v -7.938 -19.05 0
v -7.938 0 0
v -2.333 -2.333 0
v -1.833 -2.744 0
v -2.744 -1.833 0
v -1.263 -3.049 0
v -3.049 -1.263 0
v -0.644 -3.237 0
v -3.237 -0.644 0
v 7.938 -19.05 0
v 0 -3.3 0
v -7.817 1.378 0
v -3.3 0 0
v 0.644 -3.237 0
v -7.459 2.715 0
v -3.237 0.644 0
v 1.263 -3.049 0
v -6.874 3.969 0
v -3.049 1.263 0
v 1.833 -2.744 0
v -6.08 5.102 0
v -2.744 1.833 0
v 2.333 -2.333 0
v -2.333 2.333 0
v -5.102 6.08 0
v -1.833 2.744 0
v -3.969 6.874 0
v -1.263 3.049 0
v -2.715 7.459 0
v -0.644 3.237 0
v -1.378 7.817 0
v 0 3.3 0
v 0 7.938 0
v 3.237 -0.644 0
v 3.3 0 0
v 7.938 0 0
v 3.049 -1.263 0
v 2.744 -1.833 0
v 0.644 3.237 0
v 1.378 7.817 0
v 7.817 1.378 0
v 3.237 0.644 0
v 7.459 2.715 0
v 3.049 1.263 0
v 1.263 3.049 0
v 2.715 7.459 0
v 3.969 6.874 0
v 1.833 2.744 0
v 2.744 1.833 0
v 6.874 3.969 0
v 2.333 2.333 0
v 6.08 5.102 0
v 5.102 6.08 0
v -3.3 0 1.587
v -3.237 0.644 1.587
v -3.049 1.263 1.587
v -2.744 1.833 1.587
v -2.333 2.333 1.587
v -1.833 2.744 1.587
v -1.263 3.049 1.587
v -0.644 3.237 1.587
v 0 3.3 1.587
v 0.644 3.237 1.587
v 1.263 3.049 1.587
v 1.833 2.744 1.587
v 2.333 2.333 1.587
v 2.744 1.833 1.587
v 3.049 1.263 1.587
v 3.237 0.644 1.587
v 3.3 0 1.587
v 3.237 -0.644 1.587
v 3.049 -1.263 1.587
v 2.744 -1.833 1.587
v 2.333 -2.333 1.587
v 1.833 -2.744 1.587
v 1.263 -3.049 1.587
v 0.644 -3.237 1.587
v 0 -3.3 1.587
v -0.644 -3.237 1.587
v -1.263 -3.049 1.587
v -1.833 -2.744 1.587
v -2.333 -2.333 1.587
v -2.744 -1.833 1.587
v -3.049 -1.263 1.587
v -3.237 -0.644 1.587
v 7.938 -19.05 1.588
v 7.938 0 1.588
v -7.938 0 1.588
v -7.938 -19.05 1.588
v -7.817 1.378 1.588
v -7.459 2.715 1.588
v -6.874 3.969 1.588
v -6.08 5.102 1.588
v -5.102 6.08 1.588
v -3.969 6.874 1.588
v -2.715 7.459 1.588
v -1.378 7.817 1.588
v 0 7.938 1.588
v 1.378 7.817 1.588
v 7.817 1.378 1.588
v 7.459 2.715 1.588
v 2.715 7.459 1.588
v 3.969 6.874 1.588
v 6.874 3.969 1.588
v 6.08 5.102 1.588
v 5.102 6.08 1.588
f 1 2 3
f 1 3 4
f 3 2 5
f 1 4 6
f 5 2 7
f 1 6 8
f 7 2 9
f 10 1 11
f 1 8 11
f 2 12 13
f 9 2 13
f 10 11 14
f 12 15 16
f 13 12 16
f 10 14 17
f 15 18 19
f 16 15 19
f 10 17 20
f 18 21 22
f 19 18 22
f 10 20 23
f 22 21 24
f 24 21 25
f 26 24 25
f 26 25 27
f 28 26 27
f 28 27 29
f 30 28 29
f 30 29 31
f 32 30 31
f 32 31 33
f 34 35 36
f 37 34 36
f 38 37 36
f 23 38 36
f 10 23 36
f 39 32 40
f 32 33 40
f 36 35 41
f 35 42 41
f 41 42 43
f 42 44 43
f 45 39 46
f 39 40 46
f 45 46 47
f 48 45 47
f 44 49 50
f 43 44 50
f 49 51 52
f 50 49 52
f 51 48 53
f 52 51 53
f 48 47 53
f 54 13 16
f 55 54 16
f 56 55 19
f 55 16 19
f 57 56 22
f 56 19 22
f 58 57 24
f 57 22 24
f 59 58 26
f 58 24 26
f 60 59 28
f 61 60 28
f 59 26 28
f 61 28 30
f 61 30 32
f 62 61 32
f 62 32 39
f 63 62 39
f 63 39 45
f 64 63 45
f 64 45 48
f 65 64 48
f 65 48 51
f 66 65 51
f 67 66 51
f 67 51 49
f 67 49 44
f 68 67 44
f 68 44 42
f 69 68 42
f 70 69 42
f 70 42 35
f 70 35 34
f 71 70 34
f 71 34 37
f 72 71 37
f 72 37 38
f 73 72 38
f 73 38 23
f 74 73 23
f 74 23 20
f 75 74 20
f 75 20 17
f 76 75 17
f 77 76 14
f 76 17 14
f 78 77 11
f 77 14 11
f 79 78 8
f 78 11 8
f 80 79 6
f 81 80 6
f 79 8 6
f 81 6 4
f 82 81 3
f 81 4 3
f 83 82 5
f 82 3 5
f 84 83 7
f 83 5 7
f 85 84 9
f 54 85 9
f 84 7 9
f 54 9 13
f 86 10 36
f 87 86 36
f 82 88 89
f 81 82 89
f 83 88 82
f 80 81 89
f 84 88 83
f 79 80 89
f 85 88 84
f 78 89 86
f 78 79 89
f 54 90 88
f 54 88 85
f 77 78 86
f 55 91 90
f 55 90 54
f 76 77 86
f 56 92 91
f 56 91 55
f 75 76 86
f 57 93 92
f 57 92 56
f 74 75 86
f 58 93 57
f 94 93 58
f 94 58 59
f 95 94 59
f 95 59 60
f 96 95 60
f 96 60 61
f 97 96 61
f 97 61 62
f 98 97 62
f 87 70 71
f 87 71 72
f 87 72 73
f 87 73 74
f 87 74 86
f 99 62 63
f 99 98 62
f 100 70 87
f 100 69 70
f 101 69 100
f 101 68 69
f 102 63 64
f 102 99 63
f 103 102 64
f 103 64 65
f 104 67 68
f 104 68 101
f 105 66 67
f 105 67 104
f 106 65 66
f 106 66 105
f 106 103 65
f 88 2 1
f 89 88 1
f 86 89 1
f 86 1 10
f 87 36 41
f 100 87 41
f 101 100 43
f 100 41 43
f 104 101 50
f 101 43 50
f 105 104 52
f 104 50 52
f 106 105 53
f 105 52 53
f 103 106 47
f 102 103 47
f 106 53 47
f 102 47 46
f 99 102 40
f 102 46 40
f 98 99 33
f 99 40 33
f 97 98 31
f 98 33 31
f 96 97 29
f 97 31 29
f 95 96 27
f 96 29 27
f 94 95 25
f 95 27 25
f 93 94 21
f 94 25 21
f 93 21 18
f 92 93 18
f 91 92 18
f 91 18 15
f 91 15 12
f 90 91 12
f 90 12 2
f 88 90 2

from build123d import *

# Parameters (mm, degrees)
BOSS_EXTRUDE1_DEPTH  = 1.5875
M6_CLEARANCE_HOLE1_D = 6.6
SKETCH5_W            = 15.875
SKETCH5_H            = 6.35
CUT_EXTRUDE2_DEPTH   = 2.5875


with BuildPart() as part:
    # Sketch1 → Boss-Extrude1 (new body)
    with BuildSketch(Plane.XY):
        with BuildLine():
            Line((7.9375, -25.4), (7.9375, 0))
            ThreePointArc((7.9375, 0), (0, 7.9375), (-7.9375, 0))
            Line((-7.9375, 0), (-7.9375, -25.4))
            Line((-7.9375, -25.4), (7.9375, -25.4))
        make_face()
    extrude(amount=BOSS_EXTRUDE1_DEPTH)

    # M6 Clearance Hole1 (through all)
    with Locations(Plane.XY.offset(1.5875)):
        with Locations((0, 0)):
            Hole(M6_CLEARANCE_HOLE1_D / 2)

    # Sketch5 → Cut-Extrude2 (cut, through all)
    with BuildSketch(Plane.XY.offset(1.5875)):
        with Locations((0, -22.225)):
            Rectangle(SKETCH5_W, SKETCH5_H)
    extrude(amount=-CUT_EXTRUDE2_DEPTH, mode=Mode.SUBTRACT)


solid = part.part
